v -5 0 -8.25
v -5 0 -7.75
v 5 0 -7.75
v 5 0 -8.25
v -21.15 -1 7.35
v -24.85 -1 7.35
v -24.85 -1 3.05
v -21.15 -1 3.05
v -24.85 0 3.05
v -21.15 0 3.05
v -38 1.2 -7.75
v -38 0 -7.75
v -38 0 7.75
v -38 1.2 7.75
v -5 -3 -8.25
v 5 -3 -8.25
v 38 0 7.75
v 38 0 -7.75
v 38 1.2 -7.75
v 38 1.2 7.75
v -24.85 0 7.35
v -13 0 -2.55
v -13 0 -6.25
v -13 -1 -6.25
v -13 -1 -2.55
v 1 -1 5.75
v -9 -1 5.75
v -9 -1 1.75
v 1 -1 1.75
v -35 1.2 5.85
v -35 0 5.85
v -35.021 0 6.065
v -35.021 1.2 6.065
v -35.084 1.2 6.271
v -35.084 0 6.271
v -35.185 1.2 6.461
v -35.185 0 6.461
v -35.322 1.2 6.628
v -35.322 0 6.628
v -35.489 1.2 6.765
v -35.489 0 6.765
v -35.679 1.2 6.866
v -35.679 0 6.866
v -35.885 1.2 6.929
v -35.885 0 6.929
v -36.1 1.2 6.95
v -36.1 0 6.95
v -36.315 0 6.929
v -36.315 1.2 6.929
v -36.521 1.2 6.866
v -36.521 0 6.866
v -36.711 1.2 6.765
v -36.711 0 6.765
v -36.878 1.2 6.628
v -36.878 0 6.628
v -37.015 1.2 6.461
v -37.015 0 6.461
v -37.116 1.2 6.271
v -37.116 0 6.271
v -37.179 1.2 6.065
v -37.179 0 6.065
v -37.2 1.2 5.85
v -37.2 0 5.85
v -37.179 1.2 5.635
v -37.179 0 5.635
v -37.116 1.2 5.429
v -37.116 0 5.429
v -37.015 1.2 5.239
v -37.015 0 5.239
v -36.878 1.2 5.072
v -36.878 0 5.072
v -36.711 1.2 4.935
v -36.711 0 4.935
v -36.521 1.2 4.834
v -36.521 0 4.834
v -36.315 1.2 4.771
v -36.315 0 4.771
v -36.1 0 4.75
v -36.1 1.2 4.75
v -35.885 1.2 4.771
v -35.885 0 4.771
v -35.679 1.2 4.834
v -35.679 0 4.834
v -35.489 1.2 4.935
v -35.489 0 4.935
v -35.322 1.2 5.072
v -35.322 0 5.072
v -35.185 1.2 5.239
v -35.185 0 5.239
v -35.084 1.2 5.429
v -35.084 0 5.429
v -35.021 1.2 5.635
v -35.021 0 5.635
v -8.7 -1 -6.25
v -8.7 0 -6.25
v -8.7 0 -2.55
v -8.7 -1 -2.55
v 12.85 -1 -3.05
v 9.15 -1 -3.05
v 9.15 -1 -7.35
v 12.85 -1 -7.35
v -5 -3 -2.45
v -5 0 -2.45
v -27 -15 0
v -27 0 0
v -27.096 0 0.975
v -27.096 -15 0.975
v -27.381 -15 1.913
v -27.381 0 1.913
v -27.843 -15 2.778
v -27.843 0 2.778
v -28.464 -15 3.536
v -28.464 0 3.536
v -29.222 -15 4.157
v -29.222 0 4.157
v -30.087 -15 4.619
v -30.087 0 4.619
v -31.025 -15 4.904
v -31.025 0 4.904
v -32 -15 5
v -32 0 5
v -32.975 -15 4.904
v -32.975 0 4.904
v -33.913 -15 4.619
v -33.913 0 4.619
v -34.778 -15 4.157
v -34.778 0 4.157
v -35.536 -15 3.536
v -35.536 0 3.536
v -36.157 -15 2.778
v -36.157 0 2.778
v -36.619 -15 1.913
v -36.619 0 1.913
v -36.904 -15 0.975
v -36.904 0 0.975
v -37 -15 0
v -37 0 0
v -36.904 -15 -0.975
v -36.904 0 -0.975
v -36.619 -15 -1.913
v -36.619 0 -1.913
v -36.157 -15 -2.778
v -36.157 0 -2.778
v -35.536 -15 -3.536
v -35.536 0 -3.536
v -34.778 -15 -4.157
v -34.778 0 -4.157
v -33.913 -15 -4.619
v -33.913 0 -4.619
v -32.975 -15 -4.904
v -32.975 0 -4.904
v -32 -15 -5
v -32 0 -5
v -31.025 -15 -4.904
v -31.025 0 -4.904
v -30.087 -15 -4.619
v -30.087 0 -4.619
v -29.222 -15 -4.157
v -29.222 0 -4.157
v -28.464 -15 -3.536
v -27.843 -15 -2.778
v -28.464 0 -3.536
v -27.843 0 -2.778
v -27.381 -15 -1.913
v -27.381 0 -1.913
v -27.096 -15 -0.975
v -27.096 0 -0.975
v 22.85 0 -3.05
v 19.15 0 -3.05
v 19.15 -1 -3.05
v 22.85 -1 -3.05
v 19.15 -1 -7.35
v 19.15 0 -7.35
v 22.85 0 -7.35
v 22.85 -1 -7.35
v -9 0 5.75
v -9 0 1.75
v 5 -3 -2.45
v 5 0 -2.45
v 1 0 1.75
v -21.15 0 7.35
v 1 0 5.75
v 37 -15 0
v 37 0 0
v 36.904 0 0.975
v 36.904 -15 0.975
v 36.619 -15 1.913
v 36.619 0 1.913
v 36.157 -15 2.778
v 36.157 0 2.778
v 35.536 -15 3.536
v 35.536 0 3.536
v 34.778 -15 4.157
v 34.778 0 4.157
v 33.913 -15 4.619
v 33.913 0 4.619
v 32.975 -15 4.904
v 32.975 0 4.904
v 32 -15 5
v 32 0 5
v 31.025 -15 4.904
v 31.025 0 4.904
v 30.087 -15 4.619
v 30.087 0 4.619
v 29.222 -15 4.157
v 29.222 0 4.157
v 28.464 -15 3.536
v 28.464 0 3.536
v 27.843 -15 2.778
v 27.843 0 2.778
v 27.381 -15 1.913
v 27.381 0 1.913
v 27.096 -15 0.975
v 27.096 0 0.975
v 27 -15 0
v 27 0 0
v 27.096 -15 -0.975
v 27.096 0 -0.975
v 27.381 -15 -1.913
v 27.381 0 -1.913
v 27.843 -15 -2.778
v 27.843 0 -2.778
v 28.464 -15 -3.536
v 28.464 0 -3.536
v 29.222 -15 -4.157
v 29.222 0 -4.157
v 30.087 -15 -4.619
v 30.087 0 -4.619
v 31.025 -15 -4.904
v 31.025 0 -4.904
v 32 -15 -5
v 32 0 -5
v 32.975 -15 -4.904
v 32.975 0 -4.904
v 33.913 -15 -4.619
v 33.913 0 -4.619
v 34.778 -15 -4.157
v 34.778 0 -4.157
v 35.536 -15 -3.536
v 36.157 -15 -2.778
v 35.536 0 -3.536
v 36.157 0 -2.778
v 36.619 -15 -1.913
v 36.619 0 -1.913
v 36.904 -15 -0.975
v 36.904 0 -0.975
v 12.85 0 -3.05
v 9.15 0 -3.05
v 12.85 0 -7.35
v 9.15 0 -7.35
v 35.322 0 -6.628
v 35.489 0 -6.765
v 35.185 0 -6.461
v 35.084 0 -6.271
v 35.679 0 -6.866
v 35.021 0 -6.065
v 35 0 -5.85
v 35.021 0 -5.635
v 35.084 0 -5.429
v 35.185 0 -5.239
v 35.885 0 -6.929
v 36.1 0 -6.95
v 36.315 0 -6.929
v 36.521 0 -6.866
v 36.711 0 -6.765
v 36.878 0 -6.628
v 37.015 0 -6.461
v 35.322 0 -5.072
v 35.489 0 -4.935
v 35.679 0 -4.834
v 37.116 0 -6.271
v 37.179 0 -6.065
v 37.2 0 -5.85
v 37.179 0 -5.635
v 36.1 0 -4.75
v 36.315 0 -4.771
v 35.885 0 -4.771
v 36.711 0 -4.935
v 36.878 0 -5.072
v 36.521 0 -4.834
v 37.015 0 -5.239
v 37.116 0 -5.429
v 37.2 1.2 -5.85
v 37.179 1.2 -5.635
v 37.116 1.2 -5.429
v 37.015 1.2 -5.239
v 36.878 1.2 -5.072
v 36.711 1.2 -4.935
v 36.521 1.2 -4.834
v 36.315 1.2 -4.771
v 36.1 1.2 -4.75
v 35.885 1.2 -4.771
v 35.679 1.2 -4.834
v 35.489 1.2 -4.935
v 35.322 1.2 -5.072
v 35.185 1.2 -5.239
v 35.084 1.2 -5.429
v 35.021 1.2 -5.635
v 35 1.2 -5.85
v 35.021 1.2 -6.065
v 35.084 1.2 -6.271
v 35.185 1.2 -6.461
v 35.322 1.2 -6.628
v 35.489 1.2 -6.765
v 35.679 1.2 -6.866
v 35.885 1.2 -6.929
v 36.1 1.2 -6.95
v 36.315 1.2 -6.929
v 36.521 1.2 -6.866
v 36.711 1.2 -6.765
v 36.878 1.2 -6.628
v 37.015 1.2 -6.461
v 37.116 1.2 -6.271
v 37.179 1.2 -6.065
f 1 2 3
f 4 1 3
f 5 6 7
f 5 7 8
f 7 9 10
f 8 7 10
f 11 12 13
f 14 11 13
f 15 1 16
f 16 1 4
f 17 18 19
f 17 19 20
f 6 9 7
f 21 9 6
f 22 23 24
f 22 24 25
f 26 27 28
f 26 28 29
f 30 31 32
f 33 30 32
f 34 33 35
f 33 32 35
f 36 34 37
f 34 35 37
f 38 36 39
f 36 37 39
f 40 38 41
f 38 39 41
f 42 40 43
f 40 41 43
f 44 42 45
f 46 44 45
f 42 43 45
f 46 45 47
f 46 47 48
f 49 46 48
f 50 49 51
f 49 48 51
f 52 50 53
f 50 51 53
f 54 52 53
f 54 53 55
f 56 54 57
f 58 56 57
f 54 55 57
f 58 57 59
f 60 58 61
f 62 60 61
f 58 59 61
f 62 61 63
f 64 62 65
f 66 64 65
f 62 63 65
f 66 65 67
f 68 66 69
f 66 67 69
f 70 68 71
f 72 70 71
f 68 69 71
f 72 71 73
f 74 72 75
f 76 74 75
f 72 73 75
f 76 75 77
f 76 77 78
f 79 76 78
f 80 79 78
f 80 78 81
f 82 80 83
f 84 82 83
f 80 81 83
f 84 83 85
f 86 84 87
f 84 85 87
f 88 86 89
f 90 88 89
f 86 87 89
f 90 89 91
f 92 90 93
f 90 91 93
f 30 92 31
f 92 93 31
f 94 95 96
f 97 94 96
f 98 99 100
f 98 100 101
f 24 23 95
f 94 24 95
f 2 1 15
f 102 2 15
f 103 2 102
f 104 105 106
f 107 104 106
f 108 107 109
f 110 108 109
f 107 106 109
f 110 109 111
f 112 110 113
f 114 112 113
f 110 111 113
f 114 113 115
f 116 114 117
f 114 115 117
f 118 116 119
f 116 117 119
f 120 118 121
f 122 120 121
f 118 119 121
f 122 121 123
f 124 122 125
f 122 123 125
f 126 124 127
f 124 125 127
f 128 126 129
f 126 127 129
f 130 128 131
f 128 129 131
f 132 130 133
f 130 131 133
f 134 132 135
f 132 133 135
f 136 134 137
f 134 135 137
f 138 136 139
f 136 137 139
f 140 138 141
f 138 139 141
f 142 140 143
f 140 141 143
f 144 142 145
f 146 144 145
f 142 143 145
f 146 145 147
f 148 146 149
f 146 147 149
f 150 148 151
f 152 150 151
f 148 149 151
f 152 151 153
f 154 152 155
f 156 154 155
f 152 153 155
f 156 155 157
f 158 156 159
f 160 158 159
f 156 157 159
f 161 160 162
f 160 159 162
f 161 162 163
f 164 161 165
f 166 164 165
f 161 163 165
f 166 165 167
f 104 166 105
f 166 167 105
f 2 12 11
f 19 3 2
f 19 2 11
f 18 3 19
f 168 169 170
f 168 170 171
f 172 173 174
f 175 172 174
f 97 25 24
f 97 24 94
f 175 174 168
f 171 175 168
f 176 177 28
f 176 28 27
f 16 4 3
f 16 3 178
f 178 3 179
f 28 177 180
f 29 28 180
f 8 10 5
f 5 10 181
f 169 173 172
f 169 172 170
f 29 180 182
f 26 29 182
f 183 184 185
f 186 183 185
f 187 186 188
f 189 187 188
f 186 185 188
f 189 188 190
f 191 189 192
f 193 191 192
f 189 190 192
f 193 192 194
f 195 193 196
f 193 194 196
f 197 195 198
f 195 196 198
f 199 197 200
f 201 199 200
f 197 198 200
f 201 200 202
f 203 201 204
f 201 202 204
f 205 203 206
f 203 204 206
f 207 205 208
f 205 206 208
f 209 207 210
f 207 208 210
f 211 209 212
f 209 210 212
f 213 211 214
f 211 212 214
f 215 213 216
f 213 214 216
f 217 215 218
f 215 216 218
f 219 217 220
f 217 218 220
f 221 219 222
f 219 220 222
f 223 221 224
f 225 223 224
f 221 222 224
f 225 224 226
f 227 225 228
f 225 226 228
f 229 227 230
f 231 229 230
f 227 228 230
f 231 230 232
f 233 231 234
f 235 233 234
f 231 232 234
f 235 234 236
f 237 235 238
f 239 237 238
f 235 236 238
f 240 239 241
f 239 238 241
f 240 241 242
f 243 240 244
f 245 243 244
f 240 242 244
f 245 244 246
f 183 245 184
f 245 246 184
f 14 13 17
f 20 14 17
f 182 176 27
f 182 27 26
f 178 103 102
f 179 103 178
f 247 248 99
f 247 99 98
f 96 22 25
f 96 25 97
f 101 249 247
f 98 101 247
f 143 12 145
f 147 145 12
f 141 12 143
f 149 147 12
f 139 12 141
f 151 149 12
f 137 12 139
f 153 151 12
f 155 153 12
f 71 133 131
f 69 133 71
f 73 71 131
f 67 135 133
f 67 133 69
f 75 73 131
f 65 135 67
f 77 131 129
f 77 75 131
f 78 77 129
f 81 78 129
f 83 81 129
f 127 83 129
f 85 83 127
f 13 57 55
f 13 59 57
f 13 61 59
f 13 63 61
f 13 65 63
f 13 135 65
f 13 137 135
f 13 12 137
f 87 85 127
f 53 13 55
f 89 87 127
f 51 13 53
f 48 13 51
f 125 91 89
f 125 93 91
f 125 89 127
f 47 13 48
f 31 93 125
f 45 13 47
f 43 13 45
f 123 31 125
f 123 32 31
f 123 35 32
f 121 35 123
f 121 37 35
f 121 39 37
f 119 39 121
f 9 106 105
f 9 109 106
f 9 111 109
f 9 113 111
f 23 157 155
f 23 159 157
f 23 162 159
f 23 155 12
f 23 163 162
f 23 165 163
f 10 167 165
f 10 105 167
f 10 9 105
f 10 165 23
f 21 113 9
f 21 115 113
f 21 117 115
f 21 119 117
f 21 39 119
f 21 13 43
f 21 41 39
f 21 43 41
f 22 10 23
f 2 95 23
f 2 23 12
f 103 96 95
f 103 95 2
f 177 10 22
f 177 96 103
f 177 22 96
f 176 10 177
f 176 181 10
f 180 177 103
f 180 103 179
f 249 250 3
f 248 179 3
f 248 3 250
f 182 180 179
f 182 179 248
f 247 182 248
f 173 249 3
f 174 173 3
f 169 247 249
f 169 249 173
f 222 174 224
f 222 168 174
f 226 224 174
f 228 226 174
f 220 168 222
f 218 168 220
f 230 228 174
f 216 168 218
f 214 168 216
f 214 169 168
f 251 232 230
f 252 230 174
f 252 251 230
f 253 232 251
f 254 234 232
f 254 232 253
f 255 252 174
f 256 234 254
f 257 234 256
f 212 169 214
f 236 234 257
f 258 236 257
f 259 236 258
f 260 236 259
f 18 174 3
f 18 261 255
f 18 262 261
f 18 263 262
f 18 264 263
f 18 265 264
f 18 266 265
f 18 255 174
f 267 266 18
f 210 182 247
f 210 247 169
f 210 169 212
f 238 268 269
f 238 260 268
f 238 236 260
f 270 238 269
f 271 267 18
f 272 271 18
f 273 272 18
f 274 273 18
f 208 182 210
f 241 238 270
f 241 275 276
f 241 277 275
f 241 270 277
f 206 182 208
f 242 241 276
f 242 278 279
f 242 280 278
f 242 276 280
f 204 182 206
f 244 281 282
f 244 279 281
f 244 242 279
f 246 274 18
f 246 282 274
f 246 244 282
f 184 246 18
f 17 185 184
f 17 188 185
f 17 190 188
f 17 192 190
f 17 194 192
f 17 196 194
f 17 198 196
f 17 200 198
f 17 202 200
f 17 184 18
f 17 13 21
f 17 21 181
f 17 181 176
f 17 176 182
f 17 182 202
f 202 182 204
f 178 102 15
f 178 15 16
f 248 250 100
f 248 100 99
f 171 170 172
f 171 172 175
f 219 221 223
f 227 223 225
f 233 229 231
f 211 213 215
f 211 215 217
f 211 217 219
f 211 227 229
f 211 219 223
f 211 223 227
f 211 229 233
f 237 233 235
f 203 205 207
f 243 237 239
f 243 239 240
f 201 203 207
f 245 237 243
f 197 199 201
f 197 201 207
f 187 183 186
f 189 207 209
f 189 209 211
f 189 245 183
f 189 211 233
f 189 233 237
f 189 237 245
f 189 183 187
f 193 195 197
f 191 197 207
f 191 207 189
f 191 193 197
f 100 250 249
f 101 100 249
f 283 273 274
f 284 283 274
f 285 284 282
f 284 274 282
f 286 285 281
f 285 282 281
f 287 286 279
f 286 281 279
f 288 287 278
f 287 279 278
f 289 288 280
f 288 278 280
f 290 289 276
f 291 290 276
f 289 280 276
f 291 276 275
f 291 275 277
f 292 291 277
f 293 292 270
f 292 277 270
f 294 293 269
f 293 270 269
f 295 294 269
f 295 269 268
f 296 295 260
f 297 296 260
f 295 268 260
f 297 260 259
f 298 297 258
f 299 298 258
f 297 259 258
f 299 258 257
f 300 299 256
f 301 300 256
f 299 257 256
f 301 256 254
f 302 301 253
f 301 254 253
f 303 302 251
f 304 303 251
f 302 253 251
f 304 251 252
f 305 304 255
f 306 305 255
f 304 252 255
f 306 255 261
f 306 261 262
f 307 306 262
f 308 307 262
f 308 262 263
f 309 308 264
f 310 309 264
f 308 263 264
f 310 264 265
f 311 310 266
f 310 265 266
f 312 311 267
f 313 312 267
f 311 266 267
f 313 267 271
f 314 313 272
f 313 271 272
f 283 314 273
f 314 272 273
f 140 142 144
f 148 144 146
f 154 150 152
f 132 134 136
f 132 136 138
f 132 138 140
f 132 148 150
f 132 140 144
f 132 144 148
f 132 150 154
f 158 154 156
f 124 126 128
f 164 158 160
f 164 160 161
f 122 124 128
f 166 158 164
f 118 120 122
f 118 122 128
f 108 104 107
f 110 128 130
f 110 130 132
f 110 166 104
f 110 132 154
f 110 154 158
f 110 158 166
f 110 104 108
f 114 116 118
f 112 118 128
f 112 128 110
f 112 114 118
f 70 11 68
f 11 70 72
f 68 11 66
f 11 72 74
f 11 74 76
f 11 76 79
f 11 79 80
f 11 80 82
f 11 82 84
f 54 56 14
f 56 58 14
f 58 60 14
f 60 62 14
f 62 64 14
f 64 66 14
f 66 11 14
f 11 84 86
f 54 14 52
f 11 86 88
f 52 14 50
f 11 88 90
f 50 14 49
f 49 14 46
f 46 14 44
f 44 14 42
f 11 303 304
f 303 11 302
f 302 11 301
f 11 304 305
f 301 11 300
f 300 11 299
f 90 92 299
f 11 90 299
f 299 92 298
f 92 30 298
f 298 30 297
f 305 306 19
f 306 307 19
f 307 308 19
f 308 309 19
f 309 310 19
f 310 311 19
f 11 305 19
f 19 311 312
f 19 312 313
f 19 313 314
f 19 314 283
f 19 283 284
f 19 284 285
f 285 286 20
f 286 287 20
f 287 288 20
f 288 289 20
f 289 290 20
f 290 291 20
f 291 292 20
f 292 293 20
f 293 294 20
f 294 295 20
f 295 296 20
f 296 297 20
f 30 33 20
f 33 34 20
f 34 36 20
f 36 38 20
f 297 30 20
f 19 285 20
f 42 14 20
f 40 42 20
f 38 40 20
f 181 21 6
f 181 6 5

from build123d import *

# Parameters (mm, degrees)
F0_W     = 76
F0_H     = 15.5
F0_R     = 1.1
F1_DEPTH = 1.2
F2_W     = 3.7
F2_H     = 4.3
F2_W_2   = 10
F2_H_2   = 4
F2_W_3   = 4.3
F2_H_3   = 3.7
F4_DEPTH = 1
F3_R     = 5
F5_DEPTH = 15
F6_W     = 10
F6_H     = 5.8
F7_DEPTH = 3


with BuildPart() as f1:
    # F0 (on Front) → F1 (new body)
    with BuildSketch(Plane.XZ):
        Rectangle(F0_W, F0_H)
        with Locations((36.1, -5.85)):
            Circle(F0_R, mode=Mode.SUBTRACT)
        with Locations((-36.1, 5.85)):
            Circle(F0_R, mode=Mode.SUBTRACT)
    extrude(amount=-F1_DEPTH)

    # F2 (on Front) → F4 (join)
    with BuildSketch(Plane.XZ):
        with Locations((11, -5.2)):
            Rectangle(F2_W, F2_H)
        with Locations((-23, 5.2)):
            Rectangle(F2_W, F2_H)
        with Locations((21, -5.2)):
            Rectangle(F2_W, F2_H)
        with Locations((-4, 3.75)):
            Rectangle(F2_W_2, F2_H_2)
        with Locations((-10.85, -4.4)):
            Rectangle(F2_W_3, F2_H_3)
    extrude(amount=F4_DEPTH)

    # F3 (on Front) → F5 (join)
    with BuildSketch(Plane.XZ):
        with Locations((32, 0)):
            Circle(F3_R)
        with Locations((-32, 0)):
            Circle(F3_R)
    extrude(amount=F5_DEPTH)

    # F6 (on Front) → F7 (join)
    with BuildSketch(Plane.XZ):
        with Locations((0, -5.35)):
            Rectangle(F6_W, F6_H)
    extrude(amount=F7_DEPTH)


solid = f1.part
